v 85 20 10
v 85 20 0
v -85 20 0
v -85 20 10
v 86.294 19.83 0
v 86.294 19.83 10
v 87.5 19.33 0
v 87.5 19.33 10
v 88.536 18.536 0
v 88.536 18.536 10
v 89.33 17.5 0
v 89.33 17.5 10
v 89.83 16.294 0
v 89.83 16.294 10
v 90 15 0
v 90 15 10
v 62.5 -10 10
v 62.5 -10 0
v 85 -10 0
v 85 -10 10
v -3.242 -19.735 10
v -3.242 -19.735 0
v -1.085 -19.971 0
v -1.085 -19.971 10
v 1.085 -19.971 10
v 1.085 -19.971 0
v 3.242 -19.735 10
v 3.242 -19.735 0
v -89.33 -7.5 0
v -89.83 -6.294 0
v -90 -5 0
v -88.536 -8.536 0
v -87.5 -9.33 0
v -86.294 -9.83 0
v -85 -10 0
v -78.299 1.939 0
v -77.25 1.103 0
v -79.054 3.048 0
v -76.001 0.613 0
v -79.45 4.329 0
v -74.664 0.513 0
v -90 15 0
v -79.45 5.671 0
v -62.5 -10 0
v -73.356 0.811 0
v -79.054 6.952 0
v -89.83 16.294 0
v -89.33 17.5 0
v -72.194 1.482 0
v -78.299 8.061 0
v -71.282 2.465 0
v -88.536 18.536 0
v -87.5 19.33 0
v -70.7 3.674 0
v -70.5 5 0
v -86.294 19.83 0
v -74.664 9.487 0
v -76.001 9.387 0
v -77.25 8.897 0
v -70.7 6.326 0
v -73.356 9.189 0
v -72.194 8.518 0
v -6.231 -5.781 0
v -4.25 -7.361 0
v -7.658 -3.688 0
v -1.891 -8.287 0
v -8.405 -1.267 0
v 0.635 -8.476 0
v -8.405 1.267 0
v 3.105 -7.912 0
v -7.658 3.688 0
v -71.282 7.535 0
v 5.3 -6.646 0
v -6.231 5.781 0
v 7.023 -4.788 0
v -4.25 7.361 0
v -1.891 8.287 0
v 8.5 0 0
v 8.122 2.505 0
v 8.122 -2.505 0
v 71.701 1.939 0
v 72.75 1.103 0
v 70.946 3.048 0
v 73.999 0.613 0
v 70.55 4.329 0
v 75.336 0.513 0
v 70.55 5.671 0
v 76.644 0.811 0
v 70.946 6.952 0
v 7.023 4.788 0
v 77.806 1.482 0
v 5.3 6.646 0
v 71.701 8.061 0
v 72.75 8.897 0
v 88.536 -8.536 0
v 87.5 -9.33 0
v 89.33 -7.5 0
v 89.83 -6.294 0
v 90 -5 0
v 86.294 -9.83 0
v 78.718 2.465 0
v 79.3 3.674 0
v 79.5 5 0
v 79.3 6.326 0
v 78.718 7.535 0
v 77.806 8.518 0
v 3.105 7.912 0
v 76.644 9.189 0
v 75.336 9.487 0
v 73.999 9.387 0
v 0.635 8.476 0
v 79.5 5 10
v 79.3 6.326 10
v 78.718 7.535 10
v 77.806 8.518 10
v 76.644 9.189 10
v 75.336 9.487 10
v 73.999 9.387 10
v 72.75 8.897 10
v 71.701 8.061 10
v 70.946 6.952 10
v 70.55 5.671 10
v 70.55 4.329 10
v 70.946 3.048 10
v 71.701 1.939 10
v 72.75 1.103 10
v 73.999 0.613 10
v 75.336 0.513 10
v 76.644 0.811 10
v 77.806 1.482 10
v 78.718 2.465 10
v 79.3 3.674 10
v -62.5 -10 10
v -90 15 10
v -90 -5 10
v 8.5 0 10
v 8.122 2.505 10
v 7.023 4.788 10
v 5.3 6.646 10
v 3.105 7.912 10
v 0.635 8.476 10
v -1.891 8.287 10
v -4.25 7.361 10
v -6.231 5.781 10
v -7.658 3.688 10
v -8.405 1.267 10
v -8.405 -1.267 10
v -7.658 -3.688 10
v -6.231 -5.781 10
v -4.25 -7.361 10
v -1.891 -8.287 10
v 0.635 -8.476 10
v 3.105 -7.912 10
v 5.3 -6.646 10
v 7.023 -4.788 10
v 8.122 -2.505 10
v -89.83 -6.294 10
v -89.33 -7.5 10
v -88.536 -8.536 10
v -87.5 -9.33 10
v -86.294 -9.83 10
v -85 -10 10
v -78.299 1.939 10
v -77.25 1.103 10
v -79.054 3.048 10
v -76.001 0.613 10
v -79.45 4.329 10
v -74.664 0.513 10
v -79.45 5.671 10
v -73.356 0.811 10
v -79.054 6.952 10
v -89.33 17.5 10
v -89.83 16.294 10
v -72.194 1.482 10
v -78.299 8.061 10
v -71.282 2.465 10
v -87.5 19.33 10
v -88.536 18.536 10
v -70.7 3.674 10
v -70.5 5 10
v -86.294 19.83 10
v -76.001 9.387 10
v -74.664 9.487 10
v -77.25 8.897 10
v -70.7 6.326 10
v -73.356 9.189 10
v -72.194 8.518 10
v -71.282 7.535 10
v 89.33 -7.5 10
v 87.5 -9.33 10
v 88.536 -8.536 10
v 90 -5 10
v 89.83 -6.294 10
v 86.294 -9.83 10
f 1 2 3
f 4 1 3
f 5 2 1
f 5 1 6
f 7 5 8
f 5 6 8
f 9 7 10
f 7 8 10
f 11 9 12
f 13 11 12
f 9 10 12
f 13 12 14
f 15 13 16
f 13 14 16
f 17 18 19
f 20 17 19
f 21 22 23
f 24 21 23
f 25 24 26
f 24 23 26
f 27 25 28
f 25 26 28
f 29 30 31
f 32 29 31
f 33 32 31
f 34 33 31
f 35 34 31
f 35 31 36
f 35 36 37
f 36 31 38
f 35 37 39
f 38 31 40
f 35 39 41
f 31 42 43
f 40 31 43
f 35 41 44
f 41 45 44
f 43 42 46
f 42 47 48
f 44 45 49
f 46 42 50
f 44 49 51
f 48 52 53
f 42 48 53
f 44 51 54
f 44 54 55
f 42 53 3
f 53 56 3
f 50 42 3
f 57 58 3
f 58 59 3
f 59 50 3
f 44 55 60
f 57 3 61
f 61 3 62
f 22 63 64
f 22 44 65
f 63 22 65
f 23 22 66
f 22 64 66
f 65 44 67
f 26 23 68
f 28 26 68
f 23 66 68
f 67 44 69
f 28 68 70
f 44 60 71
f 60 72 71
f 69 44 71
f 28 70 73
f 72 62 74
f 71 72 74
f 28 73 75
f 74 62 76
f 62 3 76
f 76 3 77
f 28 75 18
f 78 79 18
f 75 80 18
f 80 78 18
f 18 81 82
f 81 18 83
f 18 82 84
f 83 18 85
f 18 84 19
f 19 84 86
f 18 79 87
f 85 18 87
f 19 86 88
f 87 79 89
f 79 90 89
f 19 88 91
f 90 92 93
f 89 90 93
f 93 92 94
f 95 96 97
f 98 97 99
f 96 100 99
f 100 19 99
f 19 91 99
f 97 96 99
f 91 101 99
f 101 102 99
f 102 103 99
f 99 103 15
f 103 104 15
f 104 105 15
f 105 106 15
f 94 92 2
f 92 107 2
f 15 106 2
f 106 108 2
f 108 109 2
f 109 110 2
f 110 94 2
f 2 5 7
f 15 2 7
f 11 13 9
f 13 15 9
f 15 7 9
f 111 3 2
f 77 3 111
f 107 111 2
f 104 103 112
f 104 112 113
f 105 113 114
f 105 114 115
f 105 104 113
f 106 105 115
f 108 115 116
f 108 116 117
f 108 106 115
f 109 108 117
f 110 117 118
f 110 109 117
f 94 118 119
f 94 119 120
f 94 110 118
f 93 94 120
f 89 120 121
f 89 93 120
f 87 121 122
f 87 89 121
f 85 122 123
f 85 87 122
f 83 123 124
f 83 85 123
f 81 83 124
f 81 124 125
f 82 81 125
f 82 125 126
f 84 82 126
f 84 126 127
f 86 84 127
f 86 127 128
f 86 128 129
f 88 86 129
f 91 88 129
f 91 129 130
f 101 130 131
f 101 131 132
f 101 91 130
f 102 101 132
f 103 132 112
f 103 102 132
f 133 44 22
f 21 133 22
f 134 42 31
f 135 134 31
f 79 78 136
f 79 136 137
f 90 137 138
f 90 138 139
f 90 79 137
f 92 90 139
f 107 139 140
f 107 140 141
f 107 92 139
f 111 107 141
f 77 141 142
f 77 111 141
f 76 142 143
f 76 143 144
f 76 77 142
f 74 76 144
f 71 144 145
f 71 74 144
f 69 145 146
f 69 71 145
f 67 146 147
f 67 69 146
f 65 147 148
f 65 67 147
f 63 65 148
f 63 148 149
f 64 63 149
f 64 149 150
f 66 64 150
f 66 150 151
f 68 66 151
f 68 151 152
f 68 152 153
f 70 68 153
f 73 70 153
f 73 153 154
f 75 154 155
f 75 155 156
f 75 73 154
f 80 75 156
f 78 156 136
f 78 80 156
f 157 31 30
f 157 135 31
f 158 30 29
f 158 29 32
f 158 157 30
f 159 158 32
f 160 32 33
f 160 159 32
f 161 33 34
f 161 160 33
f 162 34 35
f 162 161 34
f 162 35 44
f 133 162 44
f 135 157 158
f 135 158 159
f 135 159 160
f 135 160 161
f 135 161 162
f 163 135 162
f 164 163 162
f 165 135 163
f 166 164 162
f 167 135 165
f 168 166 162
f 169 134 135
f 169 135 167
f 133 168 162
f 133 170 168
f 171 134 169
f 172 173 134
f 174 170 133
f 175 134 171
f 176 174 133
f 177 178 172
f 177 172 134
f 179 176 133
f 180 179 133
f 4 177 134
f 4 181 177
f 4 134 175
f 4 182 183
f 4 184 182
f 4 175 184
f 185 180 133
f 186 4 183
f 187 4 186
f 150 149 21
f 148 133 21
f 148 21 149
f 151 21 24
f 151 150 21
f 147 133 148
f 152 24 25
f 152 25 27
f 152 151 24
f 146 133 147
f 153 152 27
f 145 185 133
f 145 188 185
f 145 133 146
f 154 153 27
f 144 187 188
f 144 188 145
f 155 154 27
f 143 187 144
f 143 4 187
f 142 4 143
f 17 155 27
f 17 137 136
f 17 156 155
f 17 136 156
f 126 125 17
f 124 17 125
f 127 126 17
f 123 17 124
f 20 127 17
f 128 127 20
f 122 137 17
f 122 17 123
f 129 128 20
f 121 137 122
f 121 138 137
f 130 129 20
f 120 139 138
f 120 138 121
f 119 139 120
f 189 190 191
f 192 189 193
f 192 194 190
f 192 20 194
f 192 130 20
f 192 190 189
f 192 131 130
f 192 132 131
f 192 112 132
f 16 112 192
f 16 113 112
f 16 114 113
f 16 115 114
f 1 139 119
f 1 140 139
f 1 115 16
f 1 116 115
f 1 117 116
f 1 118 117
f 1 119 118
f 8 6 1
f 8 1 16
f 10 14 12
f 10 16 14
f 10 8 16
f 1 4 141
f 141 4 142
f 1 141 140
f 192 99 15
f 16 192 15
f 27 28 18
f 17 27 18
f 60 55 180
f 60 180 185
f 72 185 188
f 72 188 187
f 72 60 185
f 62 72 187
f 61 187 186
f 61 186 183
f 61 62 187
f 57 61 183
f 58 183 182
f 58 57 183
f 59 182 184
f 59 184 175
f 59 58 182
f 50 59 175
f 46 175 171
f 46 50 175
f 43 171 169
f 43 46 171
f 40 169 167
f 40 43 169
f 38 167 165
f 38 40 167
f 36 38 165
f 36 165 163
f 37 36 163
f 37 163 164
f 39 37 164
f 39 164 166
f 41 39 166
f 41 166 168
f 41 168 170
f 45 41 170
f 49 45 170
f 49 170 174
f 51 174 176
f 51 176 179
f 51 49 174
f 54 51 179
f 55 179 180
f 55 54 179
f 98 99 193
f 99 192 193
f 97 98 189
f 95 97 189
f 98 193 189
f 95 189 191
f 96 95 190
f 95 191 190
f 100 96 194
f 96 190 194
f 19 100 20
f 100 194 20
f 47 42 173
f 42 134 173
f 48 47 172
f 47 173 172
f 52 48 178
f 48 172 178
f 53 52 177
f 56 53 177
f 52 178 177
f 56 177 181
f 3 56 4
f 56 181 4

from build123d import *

# Parameters (mm, degrees)
F0_R     = 4.5
F0_R_2   = 8.5
F1_DEPTH = 10
F2_R     = 5


with BuildPart() as f1:
    # F0 (on Top) → F1 (new body)
    with BuildSketch(Plane.XY):
        with BuildLine():
            Line((-90, 20), (-90, -10))
            Line((-90, -10), (-62.5, -10))
            Line((-62.5, -10), (-17.3205080757, -10))
            ThreePointArc((-17.3205080757, -10), (-17.3205080604, 10.0000000264), (6.11e-08, 20))
            Line((6.11e-08, 20), (-90, 20))
        make_face()
        with Locations((-75, 5)):
            Circle(F0_R, mode=Mode.SUBTRACT)
        with BuildLine():
            Line((-17.3205080757, -10), (-62.5, -10))
            Line((-62.5, -10), (-3.2423308207, -19.7354323705))
            ThreePointArc((-3.2423308207, -19.7354323705), (-11.3755108338, -16.4498557219), (-17.3205080757, -10))
        make_face()
        with BuildLine():
            ThreePointArc((6.11e-08, 20), (-17.3205080604, 10.0000000264), (-17.3205080757, -10))
            Line((-17.3205080757, -10), (17.3205080757, -10))
            ThreePointArc((17.3205080757, -10), (19.3185165258, -5.1763809021), (20, 0))
            ThreePointArc((20, 0), (14.1421356453, 14.1421356021), (6.11e-08, 20))
        make_face()
        Circle(F0_R_2, mode=Mode.SUBTRACT)
        with BuildLine():
            Line((17.3205080757, -10), (-17.3205080757, -10))
            ThreePointArc((-17.3205080757, -10), (-11.3755108338, -16.4498557219), (-3.2423308207, -19.7354323705))
            ThreePointArc((-3.2423308207, -19.7354323705), (0, -20), (3.2423308207, -19.7354323705))
            ThreePointArc((3.2423308207, -19.7354323705), (11.3755108338, -16.4498557219), (17.3205080757, -10))
        make_face()
        with BuildLine():
            Line((90, 20), (6.11e-08, 20))
            ThreePointArc((6.11e-08, 20), (14.1421356453, 14.1421356021), (20, 0))
            ThreePointArc((20, 0), (19.3185165258, -5.1763809021), (17.3205080757, -10))
            Line((17.3205080757, -10), (62.5, -10))
            Line((62.5, -10), (90, -10))
            Line((90, -10), (90, 20))
        make_face()
        with Locations((75, 5)):
            Circle(F0_R, mode=Mode.SUBTRACT)
        with BuildLine():
            Line((62.5, -10), (17.3205080757, -10))
            ThreePointArc((17.3205080757, -10), (11.3755108338, -16.4498557219), (3.2423308207, -19.7354323705))
            Line((3.2423308207, -19.7354323705), (62.5, -10))
        make_face()
    extrude(amount=F1_DEPTH)

    # F2
    f2_edges = [f1.edges().sort_by_distance(p)[0] for p in [
        (-90, -10, 5),
        (90, -10, 5),
        (-90, 20, 5),
        (90, 20, 5),
    ]]
    fillet(f2_edges, radius=F2_R)


solid = f1.part
